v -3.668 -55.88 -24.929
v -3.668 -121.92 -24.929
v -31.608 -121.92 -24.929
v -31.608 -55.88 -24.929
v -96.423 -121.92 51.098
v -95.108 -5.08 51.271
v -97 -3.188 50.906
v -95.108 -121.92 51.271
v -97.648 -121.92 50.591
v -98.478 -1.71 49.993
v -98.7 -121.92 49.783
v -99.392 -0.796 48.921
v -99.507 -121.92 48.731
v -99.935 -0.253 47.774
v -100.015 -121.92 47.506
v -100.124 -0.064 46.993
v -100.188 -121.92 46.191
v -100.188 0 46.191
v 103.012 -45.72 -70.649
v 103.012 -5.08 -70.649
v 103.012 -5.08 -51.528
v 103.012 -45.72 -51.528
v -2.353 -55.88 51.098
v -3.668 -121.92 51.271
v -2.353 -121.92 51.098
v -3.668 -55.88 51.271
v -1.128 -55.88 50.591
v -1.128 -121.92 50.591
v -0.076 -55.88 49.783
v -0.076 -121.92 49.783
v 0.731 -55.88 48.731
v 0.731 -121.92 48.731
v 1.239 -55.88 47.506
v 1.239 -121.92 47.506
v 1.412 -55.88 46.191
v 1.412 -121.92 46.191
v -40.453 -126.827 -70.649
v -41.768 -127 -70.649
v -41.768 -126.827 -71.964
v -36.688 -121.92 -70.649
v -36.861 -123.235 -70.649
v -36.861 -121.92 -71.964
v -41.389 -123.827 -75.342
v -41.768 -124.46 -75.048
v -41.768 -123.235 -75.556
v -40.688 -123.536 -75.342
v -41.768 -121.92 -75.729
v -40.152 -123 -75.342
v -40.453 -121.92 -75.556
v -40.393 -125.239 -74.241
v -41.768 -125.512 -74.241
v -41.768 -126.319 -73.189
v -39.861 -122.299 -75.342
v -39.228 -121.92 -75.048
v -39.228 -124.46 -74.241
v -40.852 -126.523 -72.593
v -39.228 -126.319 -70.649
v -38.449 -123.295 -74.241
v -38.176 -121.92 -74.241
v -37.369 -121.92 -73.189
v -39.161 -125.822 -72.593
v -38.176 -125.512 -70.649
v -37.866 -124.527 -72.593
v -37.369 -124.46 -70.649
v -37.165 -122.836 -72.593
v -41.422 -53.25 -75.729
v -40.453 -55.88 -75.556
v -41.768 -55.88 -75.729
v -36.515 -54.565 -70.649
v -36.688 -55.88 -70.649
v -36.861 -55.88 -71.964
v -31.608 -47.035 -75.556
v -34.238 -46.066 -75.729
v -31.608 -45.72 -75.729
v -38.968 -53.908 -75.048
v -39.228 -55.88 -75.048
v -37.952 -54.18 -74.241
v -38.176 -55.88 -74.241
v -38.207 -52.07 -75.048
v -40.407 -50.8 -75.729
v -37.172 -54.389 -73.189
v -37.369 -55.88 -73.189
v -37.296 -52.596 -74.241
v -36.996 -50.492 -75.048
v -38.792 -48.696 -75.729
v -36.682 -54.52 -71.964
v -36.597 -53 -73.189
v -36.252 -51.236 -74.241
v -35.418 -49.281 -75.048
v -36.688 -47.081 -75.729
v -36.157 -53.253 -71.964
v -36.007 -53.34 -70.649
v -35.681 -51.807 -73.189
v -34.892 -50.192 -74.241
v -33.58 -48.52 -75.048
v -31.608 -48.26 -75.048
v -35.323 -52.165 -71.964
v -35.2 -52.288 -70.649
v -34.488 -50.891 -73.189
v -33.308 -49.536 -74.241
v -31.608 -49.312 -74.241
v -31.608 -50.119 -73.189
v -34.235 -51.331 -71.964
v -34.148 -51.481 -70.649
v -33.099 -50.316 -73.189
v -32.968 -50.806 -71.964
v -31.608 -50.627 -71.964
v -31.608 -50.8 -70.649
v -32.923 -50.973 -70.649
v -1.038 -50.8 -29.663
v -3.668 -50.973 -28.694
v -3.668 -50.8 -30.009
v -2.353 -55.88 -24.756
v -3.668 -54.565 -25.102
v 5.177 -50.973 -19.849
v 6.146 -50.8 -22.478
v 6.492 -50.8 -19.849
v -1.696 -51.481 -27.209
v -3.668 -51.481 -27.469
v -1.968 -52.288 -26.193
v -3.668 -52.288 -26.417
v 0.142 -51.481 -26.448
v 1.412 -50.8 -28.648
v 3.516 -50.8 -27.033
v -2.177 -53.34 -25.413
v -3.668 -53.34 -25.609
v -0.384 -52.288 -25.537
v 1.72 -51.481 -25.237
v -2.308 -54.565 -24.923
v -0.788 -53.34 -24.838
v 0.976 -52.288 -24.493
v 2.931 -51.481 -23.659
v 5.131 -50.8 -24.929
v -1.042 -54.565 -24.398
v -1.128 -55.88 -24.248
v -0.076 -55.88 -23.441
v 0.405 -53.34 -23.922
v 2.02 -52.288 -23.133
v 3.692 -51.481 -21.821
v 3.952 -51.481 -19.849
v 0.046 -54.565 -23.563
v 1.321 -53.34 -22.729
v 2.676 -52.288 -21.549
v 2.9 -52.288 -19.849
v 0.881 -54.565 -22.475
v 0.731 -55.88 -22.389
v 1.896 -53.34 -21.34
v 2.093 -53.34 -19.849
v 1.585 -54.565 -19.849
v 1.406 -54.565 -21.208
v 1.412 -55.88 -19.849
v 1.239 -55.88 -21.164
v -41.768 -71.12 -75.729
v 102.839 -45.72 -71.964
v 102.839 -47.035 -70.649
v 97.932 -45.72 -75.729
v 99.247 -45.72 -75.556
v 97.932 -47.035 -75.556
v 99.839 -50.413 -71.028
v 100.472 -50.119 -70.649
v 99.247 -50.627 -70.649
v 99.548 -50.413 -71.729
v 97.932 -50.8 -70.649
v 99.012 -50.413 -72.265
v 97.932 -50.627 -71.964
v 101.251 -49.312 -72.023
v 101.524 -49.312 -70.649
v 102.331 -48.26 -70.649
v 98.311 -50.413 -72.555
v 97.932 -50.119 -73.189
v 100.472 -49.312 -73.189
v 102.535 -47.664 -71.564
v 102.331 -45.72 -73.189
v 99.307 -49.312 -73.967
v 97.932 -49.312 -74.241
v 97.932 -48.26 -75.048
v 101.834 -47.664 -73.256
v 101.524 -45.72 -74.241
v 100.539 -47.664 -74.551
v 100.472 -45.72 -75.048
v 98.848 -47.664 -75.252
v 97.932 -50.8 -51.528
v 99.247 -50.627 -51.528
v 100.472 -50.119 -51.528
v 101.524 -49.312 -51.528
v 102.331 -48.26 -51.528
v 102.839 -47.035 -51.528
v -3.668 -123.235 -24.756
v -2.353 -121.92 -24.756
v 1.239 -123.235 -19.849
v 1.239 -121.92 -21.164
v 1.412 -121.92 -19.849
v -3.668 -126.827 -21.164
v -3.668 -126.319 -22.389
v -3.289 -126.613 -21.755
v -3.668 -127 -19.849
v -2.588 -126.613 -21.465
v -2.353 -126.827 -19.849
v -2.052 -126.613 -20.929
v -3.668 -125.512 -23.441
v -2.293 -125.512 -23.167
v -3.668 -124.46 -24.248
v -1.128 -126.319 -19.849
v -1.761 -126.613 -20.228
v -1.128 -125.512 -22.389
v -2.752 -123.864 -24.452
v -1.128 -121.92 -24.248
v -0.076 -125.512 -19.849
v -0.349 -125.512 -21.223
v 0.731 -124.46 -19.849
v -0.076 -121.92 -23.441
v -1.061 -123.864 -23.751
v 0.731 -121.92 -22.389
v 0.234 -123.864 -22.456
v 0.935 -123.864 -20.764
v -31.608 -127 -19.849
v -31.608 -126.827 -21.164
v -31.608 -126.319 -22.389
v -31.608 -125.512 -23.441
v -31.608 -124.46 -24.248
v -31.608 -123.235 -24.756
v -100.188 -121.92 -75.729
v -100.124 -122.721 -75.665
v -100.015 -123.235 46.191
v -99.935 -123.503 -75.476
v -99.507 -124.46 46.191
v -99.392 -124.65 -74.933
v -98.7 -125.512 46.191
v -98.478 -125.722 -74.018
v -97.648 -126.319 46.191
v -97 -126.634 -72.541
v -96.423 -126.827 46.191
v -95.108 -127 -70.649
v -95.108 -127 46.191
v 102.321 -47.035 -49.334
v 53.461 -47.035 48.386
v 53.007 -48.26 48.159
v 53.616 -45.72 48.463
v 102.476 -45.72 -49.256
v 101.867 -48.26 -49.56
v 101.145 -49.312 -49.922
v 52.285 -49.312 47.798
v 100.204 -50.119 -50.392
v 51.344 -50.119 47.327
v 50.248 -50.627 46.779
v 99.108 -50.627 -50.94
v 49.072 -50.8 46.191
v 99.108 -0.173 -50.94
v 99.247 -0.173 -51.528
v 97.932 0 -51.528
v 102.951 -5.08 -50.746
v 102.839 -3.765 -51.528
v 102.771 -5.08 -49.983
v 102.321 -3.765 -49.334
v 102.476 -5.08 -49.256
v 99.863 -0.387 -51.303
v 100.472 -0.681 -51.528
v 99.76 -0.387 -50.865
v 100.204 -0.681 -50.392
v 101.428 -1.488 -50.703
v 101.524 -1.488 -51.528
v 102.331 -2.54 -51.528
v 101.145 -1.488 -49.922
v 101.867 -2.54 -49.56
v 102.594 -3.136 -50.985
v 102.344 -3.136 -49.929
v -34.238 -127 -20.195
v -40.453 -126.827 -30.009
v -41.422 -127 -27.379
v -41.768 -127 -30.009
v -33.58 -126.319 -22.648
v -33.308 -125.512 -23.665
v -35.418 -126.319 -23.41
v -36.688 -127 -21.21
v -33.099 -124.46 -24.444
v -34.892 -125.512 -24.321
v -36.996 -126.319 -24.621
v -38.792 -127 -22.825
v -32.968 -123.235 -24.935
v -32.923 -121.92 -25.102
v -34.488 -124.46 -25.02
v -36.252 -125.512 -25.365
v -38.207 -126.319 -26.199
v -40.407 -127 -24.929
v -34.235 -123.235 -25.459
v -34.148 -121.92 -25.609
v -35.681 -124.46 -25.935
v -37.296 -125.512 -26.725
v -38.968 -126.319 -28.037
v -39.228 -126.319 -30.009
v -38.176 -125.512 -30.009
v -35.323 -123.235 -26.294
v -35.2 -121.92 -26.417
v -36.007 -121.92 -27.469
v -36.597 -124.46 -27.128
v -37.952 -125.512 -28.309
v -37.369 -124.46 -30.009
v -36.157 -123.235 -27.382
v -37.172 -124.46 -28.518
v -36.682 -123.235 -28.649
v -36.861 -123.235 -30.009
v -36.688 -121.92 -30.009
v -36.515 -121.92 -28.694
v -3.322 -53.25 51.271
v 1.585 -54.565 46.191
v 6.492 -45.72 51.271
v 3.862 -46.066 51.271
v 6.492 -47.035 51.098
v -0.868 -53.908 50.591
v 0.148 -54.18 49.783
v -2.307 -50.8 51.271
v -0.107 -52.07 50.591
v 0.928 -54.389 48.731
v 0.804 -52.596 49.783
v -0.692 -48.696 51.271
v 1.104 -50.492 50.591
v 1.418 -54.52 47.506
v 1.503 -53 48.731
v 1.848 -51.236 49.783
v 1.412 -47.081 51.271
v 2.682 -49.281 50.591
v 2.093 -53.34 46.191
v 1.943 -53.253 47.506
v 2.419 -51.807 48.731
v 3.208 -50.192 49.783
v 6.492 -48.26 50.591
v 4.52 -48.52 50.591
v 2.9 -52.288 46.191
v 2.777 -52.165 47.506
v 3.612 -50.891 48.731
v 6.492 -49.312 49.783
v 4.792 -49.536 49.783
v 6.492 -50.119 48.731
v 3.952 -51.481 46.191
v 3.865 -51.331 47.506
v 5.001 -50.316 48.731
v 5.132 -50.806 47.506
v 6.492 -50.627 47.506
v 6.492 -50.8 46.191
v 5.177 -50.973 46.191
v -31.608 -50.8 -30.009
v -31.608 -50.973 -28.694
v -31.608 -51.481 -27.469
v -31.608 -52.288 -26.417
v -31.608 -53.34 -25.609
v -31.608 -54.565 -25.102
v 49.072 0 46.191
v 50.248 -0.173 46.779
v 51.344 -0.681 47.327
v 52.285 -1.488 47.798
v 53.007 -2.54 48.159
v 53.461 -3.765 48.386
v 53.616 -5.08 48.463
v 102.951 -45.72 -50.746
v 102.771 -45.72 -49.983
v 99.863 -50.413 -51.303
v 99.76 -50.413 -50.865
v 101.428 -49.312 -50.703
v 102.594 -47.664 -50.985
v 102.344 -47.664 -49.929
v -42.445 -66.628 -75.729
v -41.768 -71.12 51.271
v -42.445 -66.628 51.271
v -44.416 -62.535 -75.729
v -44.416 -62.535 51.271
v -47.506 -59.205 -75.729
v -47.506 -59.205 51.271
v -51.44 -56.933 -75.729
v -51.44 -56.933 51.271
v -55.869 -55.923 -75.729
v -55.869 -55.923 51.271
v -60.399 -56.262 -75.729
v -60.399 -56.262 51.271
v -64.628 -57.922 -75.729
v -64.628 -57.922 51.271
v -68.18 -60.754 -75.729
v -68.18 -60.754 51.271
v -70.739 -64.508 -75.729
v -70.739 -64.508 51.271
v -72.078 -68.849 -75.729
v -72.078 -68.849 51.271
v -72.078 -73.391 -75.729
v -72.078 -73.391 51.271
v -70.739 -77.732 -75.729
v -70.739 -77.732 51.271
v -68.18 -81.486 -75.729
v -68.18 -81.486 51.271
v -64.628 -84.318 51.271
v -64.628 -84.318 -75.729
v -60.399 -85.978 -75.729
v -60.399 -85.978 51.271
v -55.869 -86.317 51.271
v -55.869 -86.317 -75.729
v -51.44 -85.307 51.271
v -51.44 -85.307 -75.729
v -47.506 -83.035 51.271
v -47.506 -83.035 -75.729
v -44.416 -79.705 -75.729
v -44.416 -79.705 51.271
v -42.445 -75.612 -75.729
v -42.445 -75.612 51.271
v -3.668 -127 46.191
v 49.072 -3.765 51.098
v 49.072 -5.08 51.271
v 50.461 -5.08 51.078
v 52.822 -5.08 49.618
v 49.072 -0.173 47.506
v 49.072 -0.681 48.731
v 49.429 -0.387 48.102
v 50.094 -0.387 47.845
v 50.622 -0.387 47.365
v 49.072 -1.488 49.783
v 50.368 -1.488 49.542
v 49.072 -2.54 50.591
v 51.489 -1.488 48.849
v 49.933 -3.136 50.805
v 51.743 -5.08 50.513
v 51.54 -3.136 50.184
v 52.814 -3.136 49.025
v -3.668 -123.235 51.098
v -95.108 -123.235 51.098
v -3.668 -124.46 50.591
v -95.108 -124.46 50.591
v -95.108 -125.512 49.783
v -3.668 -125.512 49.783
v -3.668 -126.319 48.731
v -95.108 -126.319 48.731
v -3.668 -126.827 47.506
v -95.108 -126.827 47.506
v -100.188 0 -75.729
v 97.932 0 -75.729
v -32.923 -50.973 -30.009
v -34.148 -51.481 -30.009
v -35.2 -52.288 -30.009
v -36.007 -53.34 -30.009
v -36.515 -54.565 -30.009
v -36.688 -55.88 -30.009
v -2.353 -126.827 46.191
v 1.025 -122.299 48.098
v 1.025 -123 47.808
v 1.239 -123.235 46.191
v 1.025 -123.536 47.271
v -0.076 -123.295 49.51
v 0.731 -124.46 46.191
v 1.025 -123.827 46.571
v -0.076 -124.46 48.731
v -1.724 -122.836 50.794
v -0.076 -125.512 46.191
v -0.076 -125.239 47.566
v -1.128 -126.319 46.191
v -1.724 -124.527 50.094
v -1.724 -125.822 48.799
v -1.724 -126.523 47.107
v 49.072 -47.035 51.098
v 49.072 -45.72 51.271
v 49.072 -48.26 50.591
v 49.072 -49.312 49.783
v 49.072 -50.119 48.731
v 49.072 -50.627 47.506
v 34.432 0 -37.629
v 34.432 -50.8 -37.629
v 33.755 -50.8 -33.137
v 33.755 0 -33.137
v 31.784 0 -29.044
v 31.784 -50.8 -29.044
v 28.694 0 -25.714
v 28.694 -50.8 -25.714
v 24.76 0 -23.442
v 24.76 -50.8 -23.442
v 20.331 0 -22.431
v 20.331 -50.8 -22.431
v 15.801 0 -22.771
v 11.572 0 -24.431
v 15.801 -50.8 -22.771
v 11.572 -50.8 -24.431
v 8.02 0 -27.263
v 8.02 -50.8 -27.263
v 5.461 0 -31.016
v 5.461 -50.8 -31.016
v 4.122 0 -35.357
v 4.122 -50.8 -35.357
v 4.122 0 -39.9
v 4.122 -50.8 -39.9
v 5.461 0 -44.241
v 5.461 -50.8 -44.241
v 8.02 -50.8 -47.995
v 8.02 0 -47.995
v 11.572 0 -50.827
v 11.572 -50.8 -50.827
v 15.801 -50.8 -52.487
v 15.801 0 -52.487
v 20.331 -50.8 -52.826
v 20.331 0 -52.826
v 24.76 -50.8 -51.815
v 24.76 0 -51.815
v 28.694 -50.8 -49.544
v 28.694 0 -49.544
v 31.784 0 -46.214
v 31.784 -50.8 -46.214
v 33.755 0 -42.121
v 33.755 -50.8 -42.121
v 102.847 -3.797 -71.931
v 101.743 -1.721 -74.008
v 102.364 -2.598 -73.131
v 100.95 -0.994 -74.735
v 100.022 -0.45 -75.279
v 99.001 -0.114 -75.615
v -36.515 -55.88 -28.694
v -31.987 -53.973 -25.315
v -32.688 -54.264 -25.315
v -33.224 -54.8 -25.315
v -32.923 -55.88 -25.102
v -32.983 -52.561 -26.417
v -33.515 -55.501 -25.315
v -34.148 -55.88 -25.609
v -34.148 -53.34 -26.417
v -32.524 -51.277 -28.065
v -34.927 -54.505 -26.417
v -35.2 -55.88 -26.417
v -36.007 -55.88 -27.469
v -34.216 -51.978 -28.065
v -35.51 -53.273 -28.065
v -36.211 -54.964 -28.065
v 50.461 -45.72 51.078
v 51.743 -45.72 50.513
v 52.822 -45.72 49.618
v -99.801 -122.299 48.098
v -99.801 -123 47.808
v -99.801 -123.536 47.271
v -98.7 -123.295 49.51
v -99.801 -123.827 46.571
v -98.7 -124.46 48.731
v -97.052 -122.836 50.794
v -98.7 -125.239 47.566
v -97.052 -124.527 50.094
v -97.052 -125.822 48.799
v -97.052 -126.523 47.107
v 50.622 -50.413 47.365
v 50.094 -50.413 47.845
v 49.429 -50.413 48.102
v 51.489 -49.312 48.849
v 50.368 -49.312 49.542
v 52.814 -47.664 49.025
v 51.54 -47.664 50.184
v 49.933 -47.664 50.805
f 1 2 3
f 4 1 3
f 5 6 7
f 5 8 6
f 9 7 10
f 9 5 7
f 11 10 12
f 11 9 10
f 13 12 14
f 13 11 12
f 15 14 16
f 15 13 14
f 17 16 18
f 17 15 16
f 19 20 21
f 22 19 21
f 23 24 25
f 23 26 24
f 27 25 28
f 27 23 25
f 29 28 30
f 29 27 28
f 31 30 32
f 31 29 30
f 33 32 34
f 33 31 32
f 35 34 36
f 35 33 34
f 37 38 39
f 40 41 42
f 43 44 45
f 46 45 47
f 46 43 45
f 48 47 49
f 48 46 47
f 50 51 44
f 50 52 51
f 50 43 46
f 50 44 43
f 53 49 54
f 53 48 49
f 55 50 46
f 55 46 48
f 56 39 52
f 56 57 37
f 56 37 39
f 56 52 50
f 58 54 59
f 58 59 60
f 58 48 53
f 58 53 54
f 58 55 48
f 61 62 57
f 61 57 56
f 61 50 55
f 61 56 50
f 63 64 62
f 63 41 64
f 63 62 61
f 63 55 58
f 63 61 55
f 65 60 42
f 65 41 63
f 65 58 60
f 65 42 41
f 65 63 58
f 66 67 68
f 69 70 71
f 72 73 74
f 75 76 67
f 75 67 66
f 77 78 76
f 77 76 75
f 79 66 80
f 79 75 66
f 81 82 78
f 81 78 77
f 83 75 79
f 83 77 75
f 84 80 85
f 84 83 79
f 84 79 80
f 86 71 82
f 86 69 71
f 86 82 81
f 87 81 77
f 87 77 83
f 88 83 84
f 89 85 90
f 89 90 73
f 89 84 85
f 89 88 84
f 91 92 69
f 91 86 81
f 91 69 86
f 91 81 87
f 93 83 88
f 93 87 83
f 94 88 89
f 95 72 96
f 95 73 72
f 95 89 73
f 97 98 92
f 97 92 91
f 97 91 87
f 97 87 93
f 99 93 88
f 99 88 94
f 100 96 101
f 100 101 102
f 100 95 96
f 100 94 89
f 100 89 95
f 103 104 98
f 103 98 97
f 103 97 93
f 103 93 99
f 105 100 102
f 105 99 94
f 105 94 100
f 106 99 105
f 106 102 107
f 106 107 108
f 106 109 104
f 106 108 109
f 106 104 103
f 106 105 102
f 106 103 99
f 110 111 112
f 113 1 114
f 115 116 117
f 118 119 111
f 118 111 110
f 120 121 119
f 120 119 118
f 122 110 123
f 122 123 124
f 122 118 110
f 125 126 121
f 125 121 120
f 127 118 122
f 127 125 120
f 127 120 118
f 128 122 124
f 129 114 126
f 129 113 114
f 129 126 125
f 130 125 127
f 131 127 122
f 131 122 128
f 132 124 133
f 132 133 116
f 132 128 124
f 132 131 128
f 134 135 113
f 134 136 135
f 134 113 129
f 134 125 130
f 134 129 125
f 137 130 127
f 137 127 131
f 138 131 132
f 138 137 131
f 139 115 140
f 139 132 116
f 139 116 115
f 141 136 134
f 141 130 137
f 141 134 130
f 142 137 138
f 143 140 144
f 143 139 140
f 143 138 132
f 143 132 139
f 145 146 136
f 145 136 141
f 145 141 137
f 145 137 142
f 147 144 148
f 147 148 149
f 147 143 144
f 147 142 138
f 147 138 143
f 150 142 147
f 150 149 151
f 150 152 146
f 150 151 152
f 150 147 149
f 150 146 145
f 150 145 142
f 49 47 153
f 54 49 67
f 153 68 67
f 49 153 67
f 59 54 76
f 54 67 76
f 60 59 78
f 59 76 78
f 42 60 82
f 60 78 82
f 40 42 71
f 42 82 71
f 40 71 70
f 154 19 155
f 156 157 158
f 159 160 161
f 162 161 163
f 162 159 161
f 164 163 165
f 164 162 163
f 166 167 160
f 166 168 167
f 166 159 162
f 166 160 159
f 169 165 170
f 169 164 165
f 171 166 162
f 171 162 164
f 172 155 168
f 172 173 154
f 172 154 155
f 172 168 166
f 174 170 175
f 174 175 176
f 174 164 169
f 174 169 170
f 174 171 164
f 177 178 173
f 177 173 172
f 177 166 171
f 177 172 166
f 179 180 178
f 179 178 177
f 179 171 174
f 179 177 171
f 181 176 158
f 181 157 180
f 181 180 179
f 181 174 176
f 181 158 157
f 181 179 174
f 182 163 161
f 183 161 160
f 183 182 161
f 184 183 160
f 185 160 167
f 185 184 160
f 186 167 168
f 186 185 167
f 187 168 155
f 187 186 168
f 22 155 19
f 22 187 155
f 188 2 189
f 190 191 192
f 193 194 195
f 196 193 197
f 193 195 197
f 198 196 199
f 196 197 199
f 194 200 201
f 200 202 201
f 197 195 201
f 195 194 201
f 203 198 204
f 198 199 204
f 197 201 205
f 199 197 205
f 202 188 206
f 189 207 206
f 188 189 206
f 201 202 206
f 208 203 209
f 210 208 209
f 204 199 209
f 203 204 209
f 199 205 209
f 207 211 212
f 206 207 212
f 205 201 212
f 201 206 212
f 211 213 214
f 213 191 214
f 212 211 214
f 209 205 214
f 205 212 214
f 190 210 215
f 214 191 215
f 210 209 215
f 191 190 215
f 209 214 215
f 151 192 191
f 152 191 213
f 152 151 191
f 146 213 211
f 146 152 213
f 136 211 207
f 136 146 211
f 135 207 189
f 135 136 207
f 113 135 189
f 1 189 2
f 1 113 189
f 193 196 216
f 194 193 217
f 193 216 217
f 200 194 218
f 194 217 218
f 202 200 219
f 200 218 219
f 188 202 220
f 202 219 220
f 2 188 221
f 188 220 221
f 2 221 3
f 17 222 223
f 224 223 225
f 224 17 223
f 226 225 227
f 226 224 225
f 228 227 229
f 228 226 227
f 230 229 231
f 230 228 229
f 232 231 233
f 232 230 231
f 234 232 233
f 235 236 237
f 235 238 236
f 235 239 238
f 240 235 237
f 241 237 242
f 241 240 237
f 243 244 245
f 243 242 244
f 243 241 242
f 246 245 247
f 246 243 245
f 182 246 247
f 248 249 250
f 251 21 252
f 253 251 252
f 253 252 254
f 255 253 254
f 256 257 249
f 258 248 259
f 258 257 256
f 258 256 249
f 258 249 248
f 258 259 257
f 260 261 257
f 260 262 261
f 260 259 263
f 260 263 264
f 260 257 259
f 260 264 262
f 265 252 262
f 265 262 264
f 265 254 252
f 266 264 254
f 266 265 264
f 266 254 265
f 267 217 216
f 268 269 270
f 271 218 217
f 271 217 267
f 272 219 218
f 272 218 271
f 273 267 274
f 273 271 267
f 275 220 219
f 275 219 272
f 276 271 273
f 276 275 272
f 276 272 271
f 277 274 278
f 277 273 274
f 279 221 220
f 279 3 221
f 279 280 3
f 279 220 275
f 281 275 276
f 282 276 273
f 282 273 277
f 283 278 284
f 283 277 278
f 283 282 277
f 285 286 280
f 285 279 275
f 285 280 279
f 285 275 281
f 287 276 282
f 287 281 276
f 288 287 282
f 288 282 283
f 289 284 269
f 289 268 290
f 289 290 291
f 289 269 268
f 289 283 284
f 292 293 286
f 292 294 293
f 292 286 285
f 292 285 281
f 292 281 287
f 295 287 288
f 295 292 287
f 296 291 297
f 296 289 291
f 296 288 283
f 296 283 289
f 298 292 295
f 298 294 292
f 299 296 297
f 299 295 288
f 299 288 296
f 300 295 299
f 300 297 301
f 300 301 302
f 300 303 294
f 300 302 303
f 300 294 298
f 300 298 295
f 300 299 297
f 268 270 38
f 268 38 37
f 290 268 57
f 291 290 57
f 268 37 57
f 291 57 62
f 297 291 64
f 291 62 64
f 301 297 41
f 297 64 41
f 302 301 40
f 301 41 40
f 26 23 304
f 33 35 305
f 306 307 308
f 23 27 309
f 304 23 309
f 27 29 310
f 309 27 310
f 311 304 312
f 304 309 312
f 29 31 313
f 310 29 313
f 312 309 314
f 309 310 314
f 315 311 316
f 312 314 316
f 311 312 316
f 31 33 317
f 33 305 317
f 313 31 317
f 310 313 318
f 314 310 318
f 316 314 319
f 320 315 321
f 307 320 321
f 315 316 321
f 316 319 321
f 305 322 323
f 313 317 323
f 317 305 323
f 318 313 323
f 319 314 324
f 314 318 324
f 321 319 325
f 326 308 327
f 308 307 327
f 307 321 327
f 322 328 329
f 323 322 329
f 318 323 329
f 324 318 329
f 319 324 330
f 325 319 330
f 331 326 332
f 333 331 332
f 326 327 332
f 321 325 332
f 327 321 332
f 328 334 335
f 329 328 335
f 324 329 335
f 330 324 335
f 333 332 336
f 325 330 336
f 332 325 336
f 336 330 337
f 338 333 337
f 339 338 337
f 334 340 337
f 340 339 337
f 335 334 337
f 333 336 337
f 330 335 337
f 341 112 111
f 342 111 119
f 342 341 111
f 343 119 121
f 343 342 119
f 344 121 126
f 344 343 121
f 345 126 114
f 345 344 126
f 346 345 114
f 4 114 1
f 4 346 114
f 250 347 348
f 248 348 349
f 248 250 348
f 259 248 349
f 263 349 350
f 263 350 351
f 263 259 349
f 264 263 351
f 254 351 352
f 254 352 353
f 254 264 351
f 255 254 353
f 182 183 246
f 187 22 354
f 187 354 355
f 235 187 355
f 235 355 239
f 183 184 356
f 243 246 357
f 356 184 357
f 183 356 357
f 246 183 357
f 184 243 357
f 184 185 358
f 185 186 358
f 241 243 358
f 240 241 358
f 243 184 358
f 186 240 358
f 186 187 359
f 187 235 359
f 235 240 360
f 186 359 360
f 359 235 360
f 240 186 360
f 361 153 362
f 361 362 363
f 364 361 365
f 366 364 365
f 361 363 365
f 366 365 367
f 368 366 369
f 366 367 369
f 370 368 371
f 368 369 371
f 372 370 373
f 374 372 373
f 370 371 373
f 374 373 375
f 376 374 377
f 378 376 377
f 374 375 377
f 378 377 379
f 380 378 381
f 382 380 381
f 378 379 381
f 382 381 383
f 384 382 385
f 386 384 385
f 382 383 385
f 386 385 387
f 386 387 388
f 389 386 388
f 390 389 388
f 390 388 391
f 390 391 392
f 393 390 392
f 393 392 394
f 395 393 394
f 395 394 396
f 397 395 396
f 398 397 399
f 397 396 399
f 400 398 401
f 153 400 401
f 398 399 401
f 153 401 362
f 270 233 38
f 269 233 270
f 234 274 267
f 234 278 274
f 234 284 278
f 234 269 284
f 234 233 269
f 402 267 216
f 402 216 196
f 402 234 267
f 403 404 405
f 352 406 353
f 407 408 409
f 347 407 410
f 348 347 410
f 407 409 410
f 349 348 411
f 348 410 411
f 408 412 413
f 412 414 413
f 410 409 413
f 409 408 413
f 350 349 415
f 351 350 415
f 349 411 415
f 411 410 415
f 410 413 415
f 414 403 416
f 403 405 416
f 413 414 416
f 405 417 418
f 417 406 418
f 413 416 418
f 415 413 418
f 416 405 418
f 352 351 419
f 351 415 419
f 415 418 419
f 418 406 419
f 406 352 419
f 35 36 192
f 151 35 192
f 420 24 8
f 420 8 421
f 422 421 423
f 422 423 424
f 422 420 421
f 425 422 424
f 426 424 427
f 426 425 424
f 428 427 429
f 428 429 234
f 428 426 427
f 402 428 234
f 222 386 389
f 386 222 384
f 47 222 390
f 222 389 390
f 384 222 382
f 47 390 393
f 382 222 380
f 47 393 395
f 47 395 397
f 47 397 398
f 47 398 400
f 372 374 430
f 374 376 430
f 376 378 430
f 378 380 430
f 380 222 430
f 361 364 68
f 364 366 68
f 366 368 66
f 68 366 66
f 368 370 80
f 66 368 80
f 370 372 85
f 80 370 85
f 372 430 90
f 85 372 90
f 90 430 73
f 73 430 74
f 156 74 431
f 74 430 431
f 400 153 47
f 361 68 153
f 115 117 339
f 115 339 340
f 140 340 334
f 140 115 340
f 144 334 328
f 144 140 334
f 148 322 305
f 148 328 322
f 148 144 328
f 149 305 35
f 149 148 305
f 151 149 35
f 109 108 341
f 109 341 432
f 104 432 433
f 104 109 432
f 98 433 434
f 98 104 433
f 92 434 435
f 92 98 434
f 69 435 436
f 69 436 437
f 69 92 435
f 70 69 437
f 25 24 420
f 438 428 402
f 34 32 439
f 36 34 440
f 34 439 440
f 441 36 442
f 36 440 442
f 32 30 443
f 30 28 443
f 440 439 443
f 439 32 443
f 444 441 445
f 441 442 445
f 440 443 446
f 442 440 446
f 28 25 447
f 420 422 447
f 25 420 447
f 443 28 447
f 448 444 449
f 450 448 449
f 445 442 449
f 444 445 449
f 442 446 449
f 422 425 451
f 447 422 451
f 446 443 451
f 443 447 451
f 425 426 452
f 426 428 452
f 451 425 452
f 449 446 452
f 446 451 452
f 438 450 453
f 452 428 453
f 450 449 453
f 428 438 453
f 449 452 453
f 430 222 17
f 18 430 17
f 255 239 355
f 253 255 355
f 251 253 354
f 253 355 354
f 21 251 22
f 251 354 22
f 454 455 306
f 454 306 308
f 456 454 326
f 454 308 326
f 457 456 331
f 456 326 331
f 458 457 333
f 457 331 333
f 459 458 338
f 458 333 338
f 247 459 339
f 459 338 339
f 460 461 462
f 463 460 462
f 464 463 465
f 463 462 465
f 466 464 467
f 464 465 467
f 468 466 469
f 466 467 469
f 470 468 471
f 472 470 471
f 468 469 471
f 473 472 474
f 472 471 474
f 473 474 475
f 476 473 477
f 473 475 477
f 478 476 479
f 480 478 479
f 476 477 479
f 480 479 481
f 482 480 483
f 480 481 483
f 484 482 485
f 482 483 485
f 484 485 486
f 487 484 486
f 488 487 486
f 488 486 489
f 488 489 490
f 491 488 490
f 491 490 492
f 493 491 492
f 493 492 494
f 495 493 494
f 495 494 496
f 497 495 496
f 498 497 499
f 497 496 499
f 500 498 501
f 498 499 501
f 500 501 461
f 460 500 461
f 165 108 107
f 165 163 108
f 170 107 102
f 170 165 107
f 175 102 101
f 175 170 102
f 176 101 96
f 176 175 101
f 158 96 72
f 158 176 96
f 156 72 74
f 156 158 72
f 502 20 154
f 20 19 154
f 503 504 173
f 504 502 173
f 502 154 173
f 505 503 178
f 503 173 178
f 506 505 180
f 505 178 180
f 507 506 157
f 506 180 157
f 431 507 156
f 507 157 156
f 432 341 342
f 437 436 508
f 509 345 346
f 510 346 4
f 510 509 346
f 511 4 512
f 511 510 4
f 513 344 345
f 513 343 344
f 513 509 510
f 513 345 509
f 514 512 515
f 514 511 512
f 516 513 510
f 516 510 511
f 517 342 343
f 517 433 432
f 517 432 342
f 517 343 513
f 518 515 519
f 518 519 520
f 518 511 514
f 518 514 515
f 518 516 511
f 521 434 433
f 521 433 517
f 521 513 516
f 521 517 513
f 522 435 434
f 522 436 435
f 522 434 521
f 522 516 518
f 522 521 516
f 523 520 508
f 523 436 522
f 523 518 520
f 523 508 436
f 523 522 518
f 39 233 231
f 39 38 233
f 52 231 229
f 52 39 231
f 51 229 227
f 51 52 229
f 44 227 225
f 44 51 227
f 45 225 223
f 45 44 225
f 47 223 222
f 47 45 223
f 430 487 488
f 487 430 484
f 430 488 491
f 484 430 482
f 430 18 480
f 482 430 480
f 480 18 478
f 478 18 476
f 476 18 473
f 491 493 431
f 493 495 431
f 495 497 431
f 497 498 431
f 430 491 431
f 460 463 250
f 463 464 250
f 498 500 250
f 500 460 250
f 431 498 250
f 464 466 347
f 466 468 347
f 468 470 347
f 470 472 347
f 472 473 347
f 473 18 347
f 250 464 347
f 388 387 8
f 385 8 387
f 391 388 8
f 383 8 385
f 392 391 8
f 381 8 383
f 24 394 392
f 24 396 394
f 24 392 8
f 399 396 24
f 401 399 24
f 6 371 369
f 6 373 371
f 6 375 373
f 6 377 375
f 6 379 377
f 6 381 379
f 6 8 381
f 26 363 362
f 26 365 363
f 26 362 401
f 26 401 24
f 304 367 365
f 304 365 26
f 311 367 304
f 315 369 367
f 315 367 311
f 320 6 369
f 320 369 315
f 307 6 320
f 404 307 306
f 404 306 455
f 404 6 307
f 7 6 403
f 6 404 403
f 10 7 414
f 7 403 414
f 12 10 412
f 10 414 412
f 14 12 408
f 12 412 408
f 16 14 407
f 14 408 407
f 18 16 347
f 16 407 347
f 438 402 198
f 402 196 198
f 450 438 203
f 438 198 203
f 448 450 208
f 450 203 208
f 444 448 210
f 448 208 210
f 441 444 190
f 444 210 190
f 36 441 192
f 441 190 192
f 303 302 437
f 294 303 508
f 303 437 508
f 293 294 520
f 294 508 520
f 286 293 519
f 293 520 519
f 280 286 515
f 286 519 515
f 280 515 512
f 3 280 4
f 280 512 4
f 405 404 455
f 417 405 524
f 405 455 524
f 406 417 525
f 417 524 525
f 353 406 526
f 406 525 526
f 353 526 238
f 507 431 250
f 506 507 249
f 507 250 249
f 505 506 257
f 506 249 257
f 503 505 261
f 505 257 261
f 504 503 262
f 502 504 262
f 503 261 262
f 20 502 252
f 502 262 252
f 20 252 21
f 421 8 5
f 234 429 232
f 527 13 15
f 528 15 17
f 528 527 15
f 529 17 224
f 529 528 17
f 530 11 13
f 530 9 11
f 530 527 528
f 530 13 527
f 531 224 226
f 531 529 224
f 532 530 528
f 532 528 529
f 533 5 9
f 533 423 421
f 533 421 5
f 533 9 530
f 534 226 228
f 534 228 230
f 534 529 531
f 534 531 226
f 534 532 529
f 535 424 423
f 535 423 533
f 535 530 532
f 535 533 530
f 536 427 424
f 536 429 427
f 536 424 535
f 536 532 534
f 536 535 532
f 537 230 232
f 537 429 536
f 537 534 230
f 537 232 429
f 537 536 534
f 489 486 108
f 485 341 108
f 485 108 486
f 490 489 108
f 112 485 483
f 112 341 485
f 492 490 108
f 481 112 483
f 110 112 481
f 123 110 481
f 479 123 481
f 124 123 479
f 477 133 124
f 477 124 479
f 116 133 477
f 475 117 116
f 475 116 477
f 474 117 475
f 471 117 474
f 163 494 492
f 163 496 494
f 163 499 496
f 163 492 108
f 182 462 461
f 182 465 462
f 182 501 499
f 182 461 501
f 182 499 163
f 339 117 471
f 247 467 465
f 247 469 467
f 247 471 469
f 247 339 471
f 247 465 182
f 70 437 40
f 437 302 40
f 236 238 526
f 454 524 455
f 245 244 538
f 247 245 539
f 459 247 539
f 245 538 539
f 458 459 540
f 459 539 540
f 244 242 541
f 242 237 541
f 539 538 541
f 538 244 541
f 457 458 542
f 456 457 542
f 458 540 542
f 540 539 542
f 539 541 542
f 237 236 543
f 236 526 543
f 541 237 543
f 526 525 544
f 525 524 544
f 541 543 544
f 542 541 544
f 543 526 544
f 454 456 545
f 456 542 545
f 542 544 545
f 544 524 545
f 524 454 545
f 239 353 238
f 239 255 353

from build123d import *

# Parameters (mm, degrees)
F0_W     = 203.2
F0_H     = 127
F1_DEPTH = 127
F3_DEPTH = 76.2
F4_SIZE2 = 101.6
F4_SIZE  = 50.8
F5_R     = 5.08
F6_R     = 15.24
F7_DEPTH = 50.8
F8_R     = 15.24
F9_DEPTH = 127


with BuildPart() as f1:
    # F0 (on Front) → F1 (new body)
    with BuildSketch(Plane.XZ):
        with Locations((1.4119390398, -12.2287340821)):
            Rectangle(F0_W, F0_H)
    extrude(amount=F1_DEPTH)

    # F2 (on face) → F3 (cut)
    with BuildSketch(Plane.XZ.offset(127)):
        Polygon((-36.6880609602, -24.9287340821), (-36.6880609602, -75.7287340821), (103.0119390398, -75.7287340821), (103.0119390398, 51.2712659179), (1.4119390398, 51.2712659179), (1.4119390398, -24.9287340821), align=None)
    extrude(amount=-F3_DEPTH, mode=Mode.SUBTRACT)

    # F4
    f4_edges = [f1.edges().sort_by_distance(p)[0] for p in [
        (103.011939, -25.4, 51.271266),
    ]]
    f4_side = f1.faces().sort_by_distance((-20.35949, -52.614286, 51.271266))[0]
    chamfer(f4_edges, length=F4_SIZE, length2=F4_SIZE2, reference=f4_side)

    # F5
    f5_edges = [f1.edges().sort_by_distance(p)[0] for p in [
        (-49.388061, -127, 51.271266),
        (-100.188061, -63.5, 51.271266),
        (1.411939, -88.9, 51.271266),
        (26.811939, -50.8, 51.271266),
        (52.211939, -25.4, 51.271266),
        (-23.988061, 0, 51.271266),
        (77.611939, -50.8, 0.471266),
        (77.611939, 0, 0.471266),
        (103.011939, -25.4, -50.328734),
        (103.011939, 0, -63.028734),
        (103.011939, -25.4, -75.728734),
        (103.011939, -50.8, -63.028734),
        (33.161939, -50.8, -75.728734),
        (1.411939, -50.8, 13.171266),
        (1.411939, -88.9, -24.928734),
        (-36.688061, -50.8, -50.328734),
        (-17.638061, -127, -24.928734),
        (-36.688061, -127, -50.328734),
        (-68.438061, -127, -75.728734),
        (-36.688061, -88.9, -75.728734),
        (-17.638061, -50.8, -24.928734),
        (-36.688061, -88.9, -24.928734),
        (-100.188061, -127, -12.228734),
        (1.411939, -127, 13.171266),
    ]]
    fillet(f5_edges, radius=F5_R)

    # F6 (on face) → F7 (cut, through all)
    with BuildSketch(Plane.XZ.offset(50.8)):
        with Locations((19.1919390398, -37.6287340821)):
            Circle(F6_R)
    extrude(amount=-F7_DEPTH, mode=Mode.SUBTRACT)

    # F8 (on face) → F9 (cut, through all)
    with BuildSketch(Plane.XY.offset(51.2712659179)):
        with Locations((-57.0080609602, -71.12)):
            Circle(F8_R)
    extrude(amount=-F9_DEPTH, mode=Mode.SUBTRACT)


solid = f1.part
